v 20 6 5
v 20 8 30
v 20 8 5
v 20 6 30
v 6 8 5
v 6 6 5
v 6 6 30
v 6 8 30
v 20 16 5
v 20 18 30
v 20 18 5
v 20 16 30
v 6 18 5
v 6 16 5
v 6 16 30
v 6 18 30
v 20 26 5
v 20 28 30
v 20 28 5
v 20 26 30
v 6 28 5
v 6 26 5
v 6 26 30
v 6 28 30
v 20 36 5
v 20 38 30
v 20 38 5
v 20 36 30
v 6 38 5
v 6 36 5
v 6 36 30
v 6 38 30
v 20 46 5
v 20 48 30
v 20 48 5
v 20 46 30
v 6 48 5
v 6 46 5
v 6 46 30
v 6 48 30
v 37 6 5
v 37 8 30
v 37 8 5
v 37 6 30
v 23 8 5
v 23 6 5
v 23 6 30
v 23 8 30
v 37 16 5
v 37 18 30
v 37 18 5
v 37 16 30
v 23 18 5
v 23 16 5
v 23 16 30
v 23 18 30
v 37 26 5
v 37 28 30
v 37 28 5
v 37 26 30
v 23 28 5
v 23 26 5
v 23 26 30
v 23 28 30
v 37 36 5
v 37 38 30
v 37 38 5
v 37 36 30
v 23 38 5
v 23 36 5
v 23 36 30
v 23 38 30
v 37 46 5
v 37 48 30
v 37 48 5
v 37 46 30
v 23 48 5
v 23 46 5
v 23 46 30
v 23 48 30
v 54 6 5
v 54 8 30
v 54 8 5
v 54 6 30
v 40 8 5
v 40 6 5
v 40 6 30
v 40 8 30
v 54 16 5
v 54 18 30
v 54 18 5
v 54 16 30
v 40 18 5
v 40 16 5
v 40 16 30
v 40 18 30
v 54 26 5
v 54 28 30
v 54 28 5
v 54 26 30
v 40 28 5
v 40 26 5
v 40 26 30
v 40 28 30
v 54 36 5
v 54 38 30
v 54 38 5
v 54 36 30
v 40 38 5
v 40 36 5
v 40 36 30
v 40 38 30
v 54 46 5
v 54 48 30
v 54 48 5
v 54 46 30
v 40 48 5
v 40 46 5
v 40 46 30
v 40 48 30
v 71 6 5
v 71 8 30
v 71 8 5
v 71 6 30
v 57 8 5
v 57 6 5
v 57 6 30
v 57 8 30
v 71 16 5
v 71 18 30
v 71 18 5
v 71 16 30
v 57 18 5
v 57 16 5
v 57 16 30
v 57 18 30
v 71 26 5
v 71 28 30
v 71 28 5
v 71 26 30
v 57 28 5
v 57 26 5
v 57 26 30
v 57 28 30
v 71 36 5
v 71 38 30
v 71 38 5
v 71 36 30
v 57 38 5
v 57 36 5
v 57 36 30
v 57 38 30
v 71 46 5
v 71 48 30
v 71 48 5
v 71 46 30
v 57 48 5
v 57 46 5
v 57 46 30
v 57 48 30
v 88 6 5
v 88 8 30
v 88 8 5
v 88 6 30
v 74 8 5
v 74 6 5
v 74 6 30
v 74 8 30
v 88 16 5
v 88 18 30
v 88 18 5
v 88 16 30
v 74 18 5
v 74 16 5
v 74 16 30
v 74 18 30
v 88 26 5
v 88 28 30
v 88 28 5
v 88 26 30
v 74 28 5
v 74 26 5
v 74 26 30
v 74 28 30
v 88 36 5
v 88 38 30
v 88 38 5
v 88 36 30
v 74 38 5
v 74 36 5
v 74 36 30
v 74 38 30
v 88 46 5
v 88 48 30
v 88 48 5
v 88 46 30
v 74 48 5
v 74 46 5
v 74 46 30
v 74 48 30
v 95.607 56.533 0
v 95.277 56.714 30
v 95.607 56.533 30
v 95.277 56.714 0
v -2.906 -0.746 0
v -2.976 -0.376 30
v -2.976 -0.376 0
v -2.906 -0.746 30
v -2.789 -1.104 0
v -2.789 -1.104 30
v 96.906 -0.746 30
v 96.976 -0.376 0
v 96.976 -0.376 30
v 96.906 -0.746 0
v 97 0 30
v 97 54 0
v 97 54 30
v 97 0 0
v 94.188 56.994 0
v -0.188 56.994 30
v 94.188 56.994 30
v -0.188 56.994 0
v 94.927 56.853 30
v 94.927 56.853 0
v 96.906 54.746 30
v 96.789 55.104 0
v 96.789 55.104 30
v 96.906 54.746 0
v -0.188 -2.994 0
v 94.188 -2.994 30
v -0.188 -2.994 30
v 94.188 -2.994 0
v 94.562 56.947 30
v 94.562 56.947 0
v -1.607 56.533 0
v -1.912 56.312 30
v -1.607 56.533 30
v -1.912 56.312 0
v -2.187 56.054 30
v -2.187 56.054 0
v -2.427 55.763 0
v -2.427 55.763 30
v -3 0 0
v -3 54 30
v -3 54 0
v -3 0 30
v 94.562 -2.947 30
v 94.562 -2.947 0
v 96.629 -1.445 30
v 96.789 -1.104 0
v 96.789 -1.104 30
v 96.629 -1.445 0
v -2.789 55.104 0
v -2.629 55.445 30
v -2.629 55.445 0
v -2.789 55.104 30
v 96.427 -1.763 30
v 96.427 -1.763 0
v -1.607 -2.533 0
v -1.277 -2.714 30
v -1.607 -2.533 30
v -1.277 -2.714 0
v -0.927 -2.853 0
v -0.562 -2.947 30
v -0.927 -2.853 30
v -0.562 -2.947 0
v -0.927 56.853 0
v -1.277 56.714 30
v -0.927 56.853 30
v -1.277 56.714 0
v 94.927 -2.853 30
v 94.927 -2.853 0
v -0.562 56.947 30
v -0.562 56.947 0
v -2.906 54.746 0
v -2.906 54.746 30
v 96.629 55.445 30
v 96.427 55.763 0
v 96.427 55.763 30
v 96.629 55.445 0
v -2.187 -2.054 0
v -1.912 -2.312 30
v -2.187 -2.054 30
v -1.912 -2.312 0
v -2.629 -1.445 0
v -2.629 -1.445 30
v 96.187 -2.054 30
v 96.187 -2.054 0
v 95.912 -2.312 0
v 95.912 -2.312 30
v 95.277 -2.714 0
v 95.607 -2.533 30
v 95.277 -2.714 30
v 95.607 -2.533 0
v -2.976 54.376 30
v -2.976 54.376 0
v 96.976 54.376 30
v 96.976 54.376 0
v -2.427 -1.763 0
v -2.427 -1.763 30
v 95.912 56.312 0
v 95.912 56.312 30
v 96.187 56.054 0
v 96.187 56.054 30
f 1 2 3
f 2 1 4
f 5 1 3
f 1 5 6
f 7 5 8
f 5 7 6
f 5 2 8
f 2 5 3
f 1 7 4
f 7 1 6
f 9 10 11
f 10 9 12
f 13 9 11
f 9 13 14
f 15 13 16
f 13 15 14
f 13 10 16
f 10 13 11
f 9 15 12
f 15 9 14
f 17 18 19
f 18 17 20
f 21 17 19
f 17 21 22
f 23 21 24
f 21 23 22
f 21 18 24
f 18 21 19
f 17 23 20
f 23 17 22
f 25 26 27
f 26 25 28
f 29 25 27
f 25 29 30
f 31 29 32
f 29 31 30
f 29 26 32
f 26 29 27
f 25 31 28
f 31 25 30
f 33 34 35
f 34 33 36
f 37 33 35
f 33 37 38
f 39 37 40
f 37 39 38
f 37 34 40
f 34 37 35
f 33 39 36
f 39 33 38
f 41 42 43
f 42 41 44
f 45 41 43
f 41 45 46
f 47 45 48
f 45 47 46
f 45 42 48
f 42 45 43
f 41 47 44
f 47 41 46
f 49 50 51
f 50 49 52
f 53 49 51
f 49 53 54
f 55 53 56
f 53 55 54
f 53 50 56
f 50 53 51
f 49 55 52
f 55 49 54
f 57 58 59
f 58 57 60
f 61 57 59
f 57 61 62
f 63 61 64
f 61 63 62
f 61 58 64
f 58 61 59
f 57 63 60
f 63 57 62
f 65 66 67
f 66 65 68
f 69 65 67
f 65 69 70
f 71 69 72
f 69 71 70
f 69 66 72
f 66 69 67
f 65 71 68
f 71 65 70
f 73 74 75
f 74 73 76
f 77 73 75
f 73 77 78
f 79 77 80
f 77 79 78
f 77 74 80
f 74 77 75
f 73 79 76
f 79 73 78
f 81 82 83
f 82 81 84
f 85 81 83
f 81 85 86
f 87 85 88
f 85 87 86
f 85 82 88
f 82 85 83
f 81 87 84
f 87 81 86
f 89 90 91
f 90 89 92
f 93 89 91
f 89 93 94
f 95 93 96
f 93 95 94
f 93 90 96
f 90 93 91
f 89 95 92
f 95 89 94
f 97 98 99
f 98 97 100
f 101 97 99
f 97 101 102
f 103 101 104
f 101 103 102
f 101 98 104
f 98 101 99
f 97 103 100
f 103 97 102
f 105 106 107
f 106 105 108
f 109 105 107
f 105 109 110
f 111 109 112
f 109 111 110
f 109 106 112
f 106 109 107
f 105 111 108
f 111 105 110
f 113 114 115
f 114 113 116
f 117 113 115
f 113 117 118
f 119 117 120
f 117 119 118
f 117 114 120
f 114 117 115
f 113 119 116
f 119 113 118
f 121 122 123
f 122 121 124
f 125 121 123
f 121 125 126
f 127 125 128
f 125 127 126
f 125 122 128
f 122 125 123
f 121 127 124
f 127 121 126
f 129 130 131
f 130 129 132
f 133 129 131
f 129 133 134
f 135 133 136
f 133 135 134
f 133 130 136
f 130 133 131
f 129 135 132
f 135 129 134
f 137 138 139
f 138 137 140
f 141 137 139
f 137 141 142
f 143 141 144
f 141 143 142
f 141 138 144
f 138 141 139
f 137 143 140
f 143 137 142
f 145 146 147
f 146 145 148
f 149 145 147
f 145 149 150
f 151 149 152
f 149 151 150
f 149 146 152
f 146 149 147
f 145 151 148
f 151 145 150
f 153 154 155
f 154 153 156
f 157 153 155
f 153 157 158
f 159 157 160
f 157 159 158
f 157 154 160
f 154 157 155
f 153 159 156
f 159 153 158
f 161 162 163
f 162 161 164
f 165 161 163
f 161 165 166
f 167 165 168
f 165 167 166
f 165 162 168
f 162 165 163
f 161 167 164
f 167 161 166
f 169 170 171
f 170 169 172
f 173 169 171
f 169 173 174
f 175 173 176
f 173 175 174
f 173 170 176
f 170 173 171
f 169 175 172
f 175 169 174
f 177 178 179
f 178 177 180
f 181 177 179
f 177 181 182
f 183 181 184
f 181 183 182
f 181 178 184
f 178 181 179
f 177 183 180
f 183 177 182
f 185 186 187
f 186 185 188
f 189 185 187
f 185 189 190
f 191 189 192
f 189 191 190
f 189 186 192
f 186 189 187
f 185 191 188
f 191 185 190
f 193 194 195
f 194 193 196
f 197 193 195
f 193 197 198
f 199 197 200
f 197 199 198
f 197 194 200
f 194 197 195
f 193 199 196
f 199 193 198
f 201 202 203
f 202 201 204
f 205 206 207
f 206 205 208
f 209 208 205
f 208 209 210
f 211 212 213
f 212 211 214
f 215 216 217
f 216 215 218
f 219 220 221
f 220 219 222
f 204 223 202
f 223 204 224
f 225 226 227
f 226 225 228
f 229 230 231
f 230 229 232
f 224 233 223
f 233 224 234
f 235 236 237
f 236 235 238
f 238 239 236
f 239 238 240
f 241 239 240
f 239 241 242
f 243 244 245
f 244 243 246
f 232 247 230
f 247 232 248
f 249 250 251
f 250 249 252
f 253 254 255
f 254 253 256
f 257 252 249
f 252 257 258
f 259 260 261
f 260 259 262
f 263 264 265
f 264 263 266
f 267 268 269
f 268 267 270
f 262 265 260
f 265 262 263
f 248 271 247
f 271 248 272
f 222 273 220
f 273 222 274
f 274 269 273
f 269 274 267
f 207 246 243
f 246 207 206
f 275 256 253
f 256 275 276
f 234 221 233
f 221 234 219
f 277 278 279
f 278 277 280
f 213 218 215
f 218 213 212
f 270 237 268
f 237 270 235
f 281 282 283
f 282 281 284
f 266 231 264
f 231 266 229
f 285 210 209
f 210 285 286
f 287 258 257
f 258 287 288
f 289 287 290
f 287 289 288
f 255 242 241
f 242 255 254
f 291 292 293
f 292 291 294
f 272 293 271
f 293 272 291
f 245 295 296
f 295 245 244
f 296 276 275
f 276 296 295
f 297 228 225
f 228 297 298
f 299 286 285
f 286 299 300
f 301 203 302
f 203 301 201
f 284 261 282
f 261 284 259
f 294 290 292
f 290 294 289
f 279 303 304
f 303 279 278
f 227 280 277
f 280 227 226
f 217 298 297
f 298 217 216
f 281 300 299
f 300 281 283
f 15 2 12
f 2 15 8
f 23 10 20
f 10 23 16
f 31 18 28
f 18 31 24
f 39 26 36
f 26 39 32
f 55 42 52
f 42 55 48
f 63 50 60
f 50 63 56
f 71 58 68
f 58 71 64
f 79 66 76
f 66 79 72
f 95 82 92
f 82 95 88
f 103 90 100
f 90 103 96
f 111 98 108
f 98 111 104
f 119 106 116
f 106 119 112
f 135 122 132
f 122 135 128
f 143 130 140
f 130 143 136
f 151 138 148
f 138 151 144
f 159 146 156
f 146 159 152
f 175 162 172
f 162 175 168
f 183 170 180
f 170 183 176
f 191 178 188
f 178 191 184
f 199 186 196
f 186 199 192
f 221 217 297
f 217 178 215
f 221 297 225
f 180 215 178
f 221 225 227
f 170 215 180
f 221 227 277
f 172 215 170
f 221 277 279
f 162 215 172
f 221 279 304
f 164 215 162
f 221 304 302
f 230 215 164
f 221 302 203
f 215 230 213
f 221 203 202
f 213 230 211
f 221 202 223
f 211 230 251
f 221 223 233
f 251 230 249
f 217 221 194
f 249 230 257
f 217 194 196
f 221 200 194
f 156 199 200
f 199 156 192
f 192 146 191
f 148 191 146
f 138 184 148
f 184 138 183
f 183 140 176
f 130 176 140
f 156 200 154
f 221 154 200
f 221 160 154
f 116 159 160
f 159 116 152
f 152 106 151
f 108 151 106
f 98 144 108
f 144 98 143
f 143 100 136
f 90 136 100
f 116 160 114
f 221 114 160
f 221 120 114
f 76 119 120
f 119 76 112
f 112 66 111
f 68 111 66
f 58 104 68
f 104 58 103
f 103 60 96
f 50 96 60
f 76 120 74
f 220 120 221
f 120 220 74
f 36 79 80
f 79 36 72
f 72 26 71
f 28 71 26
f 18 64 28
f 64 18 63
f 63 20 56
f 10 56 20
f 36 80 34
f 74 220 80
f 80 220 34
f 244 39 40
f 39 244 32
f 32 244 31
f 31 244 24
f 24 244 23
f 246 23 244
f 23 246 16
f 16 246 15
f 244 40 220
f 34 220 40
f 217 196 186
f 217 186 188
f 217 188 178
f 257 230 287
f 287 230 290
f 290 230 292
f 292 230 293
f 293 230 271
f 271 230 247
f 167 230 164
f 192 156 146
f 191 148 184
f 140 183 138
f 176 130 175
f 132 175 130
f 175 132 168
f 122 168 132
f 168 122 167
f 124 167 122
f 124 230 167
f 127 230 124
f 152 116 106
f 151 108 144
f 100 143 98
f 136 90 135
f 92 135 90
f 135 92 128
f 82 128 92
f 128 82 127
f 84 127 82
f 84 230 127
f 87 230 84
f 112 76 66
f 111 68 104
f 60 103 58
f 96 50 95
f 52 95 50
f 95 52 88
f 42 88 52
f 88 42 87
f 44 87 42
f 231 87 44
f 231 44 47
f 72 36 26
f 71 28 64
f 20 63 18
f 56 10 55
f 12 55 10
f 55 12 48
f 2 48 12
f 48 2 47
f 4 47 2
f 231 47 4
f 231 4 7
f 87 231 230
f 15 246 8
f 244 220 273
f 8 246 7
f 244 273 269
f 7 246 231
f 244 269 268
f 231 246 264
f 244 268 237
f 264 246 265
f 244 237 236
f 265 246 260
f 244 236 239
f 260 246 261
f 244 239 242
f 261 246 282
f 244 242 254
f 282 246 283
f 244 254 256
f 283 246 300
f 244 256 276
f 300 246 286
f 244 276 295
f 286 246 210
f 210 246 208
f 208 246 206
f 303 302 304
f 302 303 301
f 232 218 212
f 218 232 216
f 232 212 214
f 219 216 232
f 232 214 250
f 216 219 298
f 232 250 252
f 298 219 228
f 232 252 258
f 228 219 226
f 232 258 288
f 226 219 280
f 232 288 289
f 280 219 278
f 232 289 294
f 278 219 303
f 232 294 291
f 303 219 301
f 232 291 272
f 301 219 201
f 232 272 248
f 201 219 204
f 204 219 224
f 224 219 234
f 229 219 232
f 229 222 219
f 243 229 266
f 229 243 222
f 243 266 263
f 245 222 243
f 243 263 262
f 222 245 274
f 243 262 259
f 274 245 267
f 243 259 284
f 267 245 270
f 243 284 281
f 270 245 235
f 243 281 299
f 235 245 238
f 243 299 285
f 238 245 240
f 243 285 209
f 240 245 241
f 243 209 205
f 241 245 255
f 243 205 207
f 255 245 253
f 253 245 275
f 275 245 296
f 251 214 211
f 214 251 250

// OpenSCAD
// holder for collar stays
$fn=50*1;

//How wide should the box be (mm)?
wt = 100; //[24:250]
w=wt-6;

//How deep should the box be (mm)?
dt = 60; //[16:250]
d=dt-6;

//How many slots across width?
hw = floor((w)/17);

//Gap size on end
gw = (w-(hw-1)*17)/2;

//How many slots across depth
hd = floor((d)/10);

//Gap size on end
gd = (d-(hd-1)*10)/2;
echo (gd);

difference() {
	minkowski(){
		cube([w,d,29]);
		cylinder (r=3,h=1);
	}
	for (i = [0:hw-1]) {
		for (j = [0:hd-1]) {
			translate([gw+i*17-7,gd+j*10-1,5]) cube([14,2,29]);
		}
      }
}

